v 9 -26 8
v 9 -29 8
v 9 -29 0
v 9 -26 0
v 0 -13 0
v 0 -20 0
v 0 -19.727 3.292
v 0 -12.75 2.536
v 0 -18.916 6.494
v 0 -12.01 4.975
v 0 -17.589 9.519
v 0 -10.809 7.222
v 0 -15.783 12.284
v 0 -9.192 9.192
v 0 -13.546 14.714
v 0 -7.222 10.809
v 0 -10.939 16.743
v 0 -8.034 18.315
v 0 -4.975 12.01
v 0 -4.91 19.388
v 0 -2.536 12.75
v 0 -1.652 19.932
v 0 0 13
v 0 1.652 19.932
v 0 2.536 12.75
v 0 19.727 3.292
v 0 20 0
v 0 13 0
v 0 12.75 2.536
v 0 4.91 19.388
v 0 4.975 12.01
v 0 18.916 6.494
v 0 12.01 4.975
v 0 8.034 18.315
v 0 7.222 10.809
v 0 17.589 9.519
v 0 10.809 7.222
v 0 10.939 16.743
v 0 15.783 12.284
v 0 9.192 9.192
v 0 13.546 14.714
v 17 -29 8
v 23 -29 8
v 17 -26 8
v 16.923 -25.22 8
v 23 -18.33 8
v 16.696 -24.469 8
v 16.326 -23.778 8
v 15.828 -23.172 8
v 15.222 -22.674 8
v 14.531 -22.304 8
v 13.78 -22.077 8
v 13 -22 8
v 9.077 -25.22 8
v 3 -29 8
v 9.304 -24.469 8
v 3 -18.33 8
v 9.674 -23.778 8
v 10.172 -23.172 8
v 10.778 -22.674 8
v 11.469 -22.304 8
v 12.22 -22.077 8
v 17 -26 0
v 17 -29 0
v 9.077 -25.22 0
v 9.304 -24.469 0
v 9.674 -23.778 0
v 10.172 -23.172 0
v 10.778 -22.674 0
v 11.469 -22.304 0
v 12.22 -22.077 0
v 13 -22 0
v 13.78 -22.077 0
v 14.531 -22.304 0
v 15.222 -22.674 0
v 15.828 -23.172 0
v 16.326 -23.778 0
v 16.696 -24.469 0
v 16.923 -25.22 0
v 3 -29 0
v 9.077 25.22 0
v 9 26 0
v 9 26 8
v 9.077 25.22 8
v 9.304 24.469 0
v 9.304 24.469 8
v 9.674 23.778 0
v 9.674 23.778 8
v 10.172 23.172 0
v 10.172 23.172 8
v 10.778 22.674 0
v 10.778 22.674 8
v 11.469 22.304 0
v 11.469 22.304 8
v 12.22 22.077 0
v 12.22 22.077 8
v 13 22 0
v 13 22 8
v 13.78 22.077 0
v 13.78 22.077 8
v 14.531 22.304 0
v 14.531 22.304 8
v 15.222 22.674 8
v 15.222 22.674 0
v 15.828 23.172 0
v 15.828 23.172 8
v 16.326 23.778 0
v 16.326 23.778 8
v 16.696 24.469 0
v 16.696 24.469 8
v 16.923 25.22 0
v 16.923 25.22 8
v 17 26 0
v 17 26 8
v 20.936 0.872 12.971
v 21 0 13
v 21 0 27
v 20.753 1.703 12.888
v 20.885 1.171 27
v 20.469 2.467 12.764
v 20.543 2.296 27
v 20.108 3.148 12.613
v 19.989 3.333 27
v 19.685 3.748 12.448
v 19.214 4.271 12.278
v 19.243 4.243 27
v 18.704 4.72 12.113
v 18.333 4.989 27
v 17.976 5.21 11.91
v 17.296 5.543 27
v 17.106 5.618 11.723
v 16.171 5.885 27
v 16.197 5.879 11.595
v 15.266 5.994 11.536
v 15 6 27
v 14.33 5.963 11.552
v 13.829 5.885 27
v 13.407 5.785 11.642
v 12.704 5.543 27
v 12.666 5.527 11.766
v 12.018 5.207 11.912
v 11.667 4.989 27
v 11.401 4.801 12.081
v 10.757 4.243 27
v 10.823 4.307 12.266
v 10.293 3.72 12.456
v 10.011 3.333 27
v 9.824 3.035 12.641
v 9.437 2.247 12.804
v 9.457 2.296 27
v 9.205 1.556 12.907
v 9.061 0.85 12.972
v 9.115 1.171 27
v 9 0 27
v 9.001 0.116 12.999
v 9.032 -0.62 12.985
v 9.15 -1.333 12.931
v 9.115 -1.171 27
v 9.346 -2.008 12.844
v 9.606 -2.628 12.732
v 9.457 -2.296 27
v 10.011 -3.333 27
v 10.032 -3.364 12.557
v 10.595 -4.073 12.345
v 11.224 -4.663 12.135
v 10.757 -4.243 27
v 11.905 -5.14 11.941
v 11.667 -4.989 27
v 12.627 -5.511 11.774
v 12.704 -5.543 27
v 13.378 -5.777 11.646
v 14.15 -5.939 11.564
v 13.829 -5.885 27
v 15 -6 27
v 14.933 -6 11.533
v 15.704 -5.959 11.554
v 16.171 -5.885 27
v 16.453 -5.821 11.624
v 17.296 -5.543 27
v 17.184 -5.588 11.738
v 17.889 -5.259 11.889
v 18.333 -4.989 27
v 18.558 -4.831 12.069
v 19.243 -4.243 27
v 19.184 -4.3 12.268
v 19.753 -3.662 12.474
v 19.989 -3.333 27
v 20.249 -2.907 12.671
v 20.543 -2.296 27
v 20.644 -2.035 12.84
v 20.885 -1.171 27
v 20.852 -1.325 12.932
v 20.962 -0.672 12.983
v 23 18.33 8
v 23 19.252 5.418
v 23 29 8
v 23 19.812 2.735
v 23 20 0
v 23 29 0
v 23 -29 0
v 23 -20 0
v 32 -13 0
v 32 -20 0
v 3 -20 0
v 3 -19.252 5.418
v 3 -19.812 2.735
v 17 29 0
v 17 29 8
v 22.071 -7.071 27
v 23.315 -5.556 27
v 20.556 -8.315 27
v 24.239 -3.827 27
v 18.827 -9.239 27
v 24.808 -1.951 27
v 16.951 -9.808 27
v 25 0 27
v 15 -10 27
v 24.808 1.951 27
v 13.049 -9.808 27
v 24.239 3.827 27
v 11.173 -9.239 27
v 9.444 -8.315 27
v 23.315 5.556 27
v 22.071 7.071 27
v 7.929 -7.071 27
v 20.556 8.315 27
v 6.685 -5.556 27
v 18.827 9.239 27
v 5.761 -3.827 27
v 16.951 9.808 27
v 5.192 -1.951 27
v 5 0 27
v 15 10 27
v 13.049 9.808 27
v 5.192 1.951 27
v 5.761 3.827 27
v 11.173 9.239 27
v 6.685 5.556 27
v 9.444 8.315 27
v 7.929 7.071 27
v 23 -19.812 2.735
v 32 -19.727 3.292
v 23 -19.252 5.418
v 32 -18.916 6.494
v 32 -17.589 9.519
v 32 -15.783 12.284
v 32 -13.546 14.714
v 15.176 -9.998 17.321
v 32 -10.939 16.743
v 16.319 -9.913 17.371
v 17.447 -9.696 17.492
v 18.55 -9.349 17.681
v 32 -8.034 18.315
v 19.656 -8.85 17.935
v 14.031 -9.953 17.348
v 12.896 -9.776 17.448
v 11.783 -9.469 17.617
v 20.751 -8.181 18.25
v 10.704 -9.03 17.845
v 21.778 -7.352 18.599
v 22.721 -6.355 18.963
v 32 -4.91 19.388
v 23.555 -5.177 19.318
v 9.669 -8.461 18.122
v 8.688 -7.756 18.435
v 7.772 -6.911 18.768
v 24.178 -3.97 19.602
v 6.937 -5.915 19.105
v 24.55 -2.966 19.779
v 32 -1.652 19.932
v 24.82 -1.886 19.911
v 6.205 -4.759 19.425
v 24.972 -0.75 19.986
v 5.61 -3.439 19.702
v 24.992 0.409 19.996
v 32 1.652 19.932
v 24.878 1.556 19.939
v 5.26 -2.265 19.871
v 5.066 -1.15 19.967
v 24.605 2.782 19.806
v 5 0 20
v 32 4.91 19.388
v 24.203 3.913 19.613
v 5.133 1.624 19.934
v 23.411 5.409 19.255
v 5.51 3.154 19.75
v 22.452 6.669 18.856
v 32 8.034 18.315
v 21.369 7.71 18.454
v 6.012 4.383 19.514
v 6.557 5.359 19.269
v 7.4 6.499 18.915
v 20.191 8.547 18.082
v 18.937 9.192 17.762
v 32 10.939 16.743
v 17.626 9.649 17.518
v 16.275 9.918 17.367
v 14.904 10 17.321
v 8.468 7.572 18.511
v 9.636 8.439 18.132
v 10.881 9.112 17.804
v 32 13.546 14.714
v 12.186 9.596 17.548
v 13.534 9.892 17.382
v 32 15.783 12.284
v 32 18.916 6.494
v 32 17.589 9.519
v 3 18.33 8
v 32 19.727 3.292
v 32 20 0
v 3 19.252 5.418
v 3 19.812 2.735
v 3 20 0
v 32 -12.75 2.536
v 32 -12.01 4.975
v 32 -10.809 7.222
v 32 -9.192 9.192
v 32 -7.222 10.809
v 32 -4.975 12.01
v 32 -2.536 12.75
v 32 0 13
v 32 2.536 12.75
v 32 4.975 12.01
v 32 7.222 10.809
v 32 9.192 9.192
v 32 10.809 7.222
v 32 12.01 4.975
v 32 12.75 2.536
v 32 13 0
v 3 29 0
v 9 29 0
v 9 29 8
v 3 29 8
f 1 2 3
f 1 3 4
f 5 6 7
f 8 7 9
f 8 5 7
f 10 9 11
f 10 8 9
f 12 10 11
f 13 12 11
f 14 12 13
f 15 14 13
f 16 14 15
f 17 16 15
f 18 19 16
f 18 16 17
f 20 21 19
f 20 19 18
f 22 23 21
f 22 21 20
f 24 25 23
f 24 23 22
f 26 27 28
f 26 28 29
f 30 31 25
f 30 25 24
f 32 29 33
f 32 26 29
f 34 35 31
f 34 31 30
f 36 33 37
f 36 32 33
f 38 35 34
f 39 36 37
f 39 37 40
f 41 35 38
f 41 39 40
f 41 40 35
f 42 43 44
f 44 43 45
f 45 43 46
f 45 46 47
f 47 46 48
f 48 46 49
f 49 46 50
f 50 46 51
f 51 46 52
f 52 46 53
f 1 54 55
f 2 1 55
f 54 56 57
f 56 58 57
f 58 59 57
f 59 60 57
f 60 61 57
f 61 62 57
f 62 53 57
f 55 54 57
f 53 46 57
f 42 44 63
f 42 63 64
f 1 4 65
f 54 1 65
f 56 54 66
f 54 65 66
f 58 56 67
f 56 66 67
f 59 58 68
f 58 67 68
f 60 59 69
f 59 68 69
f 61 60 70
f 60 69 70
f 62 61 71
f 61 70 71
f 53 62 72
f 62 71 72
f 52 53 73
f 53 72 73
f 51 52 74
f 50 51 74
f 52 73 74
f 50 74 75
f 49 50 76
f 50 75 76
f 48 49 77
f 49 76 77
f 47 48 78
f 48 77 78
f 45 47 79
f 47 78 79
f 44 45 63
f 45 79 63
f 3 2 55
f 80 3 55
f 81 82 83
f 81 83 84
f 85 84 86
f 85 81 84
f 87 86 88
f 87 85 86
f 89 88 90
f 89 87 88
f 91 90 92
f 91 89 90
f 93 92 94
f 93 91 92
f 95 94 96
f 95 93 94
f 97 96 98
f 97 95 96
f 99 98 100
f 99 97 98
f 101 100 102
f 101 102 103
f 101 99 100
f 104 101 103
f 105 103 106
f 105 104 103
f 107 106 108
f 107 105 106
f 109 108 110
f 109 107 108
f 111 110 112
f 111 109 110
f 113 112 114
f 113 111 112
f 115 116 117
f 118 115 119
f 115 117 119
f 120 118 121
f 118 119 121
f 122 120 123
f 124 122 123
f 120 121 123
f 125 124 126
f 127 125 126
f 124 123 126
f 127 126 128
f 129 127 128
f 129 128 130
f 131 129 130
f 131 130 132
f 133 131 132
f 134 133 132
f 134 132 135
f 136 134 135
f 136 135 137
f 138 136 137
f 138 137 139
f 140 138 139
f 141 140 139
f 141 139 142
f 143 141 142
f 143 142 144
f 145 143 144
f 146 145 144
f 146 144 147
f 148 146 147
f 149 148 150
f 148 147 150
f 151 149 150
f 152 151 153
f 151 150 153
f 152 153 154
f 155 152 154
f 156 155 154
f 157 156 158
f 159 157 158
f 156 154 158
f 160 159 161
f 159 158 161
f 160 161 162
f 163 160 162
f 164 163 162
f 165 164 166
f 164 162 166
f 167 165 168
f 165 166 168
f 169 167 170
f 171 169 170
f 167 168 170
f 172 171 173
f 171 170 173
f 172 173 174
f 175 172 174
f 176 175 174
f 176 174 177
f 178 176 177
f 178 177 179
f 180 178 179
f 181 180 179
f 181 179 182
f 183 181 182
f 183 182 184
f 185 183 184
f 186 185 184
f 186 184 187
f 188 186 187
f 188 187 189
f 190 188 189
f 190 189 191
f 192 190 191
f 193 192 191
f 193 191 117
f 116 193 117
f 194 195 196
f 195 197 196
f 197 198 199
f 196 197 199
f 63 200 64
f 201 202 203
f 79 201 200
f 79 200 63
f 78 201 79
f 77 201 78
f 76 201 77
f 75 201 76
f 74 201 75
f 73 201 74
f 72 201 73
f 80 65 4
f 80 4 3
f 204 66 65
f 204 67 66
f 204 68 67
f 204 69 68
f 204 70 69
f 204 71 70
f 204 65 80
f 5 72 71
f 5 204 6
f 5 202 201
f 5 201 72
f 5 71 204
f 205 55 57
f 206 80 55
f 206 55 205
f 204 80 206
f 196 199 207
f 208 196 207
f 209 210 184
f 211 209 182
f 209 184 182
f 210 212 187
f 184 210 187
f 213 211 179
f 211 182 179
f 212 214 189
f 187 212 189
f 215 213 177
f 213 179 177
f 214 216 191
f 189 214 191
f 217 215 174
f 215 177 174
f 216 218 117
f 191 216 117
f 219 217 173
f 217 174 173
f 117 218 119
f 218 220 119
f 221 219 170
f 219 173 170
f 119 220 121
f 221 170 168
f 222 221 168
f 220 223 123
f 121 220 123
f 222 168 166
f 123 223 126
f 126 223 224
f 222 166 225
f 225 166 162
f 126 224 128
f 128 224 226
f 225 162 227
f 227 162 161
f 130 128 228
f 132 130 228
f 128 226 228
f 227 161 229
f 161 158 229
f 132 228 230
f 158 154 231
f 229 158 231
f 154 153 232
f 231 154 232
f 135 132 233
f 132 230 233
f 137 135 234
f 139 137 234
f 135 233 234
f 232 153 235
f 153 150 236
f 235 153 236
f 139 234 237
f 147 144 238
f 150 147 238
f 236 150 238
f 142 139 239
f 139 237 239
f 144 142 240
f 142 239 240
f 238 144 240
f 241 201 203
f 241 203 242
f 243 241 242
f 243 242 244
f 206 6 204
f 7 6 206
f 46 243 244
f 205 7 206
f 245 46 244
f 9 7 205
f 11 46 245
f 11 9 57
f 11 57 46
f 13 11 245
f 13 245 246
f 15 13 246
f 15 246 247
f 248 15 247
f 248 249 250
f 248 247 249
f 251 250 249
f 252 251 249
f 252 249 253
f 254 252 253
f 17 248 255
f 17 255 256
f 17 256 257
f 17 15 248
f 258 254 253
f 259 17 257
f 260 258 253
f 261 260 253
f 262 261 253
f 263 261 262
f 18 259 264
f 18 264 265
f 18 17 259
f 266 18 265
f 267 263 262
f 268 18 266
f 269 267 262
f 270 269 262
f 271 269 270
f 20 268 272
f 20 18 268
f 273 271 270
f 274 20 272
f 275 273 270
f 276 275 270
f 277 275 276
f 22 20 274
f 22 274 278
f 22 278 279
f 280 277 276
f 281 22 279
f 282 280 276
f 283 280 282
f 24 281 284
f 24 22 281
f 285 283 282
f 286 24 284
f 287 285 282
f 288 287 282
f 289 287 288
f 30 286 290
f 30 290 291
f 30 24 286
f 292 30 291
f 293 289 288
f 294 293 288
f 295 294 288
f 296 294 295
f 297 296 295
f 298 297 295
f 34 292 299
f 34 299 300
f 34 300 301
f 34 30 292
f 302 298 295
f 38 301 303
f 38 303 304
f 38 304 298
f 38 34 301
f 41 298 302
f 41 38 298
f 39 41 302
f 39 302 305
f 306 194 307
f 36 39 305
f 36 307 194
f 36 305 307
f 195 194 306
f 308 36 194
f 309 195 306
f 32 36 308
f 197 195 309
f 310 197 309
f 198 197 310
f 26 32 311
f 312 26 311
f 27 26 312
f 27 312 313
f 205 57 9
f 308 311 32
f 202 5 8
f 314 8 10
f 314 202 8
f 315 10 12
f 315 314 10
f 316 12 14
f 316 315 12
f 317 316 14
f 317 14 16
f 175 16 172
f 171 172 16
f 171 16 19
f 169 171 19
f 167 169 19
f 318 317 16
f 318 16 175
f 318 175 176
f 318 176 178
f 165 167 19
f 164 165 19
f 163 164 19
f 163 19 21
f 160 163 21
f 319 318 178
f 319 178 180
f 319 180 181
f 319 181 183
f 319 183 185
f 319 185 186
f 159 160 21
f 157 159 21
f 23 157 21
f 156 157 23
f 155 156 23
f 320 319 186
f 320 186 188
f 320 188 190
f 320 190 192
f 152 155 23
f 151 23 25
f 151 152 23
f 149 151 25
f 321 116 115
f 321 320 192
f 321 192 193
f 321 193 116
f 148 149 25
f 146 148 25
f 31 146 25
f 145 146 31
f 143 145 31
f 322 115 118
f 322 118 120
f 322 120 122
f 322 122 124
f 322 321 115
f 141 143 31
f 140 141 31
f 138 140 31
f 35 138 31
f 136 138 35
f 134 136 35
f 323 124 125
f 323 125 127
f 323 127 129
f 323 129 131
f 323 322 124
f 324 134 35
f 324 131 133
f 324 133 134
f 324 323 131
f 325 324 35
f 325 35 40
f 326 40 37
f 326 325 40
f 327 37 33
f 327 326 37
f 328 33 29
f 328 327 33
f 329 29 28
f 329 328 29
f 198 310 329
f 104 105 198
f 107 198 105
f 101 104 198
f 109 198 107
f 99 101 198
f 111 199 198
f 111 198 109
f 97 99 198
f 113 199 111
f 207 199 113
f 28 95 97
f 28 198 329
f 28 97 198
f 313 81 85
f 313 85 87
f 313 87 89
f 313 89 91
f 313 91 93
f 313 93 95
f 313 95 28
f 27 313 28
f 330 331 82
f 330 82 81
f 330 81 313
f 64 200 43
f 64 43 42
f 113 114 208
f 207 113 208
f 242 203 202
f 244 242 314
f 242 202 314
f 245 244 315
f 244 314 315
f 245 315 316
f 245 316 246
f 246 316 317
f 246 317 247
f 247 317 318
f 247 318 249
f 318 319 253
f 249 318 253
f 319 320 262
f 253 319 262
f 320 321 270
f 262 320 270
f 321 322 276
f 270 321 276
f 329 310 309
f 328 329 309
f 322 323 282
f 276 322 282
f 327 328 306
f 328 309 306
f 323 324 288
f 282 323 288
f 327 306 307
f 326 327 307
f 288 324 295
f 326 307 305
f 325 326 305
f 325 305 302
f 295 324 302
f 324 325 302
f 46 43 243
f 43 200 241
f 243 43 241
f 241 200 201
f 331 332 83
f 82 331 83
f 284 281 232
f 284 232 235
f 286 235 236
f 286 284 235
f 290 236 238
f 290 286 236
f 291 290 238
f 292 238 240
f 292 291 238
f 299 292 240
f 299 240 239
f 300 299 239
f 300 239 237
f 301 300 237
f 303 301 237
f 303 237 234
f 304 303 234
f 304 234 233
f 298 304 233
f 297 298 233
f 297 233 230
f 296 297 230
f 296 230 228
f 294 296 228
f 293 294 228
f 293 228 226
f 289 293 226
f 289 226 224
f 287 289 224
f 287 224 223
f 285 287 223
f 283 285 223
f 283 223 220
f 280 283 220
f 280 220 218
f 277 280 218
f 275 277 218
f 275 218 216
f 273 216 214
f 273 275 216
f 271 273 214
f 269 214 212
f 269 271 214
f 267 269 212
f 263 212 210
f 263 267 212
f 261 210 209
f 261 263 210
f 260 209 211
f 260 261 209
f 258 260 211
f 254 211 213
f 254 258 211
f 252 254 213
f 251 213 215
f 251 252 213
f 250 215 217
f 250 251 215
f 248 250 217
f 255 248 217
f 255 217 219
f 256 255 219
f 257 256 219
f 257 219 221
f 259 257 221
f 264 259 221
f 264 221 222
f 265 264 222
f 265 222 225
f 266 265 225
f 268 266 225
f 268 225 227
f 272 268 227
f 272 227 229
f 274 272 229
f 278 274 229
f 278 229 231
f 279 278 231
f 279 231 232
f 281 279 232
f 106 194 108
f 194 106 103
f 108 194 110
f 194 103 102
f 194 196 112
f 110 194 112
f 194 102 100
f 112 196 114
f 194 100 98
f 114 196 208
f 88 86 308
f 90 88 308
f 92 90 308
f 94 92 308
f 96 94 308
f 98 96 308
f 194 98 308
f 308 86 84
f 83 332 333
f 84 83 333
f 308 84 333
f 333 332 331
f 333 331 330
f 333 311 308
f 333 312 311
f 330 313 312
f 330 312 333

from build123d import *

# Parameters (mm, degrees)
EXTRUDE_1_DEPTH     = 32
SKETCH_2_R          = 10
EXTRUDE_2_DEPTH     = 27
SKETCH_3_W          = 20
SKETCH_3_H          = 58
EXTRUDE_3_DEPTH     = 8
SKETCH_4_R          = 6
CUT_EXTRUDE_1_DEPTH = 51.931326429
CUT_EXTRUDE_2_DEPTH = 51.931326429
CUT_EXTRUDE_4_DEPTH = 8


with BuildPart() as part:
    # 草图1 → 凸台-拉伸1 (new body)
    with BuildSketch(Plane(origin=(0, 0, 0), x_dir=(0, 0, -1), z_dir=(1, 0, 0))):
        with BuildLine():
            Line((0, 20), (0, -20))
            ThreePointArc((0, -20), (-20, 0), (0, 20))
        make_face()
    extrude(amount=EXTRUDE_1_DEPTH)

    # 草图2 → 凸台-拉伸2 (add)
    with BuildSketch(Plane(origin=(0, 0, 0), x_dir=(-1, 0, 0), z_dir=(0, 0, -1))):
        with Locations((-15, 0)):
            Circle(SKETCH_2_R)
    extrude(amount=-EXTRUDE_2_DEPTH)

    # 草图3 → 凸台-拉伸3 (add)
    with BuildSketch(Plane(origin=(0, 0, 0), x_dir=(-1, 0, 0), z_dir=(0, 0, -1))):
        with Locations((-13, 0)):
            Rectangle(SKETCH_3_W, SKETCH_3_H)
    extrude(amount=-EXTRUDE_3_DEPTH)

    # 草图4 → 切除-拉伸1 (cut, through all)
    with BuildSketch(Plane.XY.offset(27)):
        with Locations((15, 0)):
            Circle(SKETCH_4_R)
    extrude(amount=-CUT_EXTRUDE_1_DEPTH, mode=Mode.SUBTRACT)

    # 草图5 → 切除-拉伸2 (cut, through all)
    with BuildSketch(Plane(origin=(32, 0, 0), x_dir=(0, 0, -1), z_dir=(1, 0, 0))):
        with BuildLine():
            Line((0, 13), (0, -13))
            ThreePointArc((0, -13), (-13, 0), (0, 13))
        make_face()
    extrude(amount=-CUT_EXTRUDE_2_DEPTH, mode=Mode.SUBTRACT)

    # 草图6 → 切除-拉伸4 (cut)
    with BuildSketch(Plane(origin=(0, 0, 0), x_dir=(-1, 0, 0), z_dir=(0, 0, -1))):
        with BuildLine():
            Line((-17, 26), (-17, 29))
            Line((-17, 29), (-9, 29))
            Line((-9, 29), (-9, 26))
            ThreePointArc((-9, 26), (-13, 22), (-17, 26))
        make_face()
        with BuildLine():
            Line((-17, -26), (-17, -29))
            Line((-17, -29), (-9, -29))
            Line((-9, -29), (-9, -26))
            ThreePointArc((-9, -26), (-13, -22), (-17, -26))
        make_face()
    extrude(amount=-CUT_EXTRUDE_4_DEPTH, mode=Mode.SUBTRACT)


solid = part.part
